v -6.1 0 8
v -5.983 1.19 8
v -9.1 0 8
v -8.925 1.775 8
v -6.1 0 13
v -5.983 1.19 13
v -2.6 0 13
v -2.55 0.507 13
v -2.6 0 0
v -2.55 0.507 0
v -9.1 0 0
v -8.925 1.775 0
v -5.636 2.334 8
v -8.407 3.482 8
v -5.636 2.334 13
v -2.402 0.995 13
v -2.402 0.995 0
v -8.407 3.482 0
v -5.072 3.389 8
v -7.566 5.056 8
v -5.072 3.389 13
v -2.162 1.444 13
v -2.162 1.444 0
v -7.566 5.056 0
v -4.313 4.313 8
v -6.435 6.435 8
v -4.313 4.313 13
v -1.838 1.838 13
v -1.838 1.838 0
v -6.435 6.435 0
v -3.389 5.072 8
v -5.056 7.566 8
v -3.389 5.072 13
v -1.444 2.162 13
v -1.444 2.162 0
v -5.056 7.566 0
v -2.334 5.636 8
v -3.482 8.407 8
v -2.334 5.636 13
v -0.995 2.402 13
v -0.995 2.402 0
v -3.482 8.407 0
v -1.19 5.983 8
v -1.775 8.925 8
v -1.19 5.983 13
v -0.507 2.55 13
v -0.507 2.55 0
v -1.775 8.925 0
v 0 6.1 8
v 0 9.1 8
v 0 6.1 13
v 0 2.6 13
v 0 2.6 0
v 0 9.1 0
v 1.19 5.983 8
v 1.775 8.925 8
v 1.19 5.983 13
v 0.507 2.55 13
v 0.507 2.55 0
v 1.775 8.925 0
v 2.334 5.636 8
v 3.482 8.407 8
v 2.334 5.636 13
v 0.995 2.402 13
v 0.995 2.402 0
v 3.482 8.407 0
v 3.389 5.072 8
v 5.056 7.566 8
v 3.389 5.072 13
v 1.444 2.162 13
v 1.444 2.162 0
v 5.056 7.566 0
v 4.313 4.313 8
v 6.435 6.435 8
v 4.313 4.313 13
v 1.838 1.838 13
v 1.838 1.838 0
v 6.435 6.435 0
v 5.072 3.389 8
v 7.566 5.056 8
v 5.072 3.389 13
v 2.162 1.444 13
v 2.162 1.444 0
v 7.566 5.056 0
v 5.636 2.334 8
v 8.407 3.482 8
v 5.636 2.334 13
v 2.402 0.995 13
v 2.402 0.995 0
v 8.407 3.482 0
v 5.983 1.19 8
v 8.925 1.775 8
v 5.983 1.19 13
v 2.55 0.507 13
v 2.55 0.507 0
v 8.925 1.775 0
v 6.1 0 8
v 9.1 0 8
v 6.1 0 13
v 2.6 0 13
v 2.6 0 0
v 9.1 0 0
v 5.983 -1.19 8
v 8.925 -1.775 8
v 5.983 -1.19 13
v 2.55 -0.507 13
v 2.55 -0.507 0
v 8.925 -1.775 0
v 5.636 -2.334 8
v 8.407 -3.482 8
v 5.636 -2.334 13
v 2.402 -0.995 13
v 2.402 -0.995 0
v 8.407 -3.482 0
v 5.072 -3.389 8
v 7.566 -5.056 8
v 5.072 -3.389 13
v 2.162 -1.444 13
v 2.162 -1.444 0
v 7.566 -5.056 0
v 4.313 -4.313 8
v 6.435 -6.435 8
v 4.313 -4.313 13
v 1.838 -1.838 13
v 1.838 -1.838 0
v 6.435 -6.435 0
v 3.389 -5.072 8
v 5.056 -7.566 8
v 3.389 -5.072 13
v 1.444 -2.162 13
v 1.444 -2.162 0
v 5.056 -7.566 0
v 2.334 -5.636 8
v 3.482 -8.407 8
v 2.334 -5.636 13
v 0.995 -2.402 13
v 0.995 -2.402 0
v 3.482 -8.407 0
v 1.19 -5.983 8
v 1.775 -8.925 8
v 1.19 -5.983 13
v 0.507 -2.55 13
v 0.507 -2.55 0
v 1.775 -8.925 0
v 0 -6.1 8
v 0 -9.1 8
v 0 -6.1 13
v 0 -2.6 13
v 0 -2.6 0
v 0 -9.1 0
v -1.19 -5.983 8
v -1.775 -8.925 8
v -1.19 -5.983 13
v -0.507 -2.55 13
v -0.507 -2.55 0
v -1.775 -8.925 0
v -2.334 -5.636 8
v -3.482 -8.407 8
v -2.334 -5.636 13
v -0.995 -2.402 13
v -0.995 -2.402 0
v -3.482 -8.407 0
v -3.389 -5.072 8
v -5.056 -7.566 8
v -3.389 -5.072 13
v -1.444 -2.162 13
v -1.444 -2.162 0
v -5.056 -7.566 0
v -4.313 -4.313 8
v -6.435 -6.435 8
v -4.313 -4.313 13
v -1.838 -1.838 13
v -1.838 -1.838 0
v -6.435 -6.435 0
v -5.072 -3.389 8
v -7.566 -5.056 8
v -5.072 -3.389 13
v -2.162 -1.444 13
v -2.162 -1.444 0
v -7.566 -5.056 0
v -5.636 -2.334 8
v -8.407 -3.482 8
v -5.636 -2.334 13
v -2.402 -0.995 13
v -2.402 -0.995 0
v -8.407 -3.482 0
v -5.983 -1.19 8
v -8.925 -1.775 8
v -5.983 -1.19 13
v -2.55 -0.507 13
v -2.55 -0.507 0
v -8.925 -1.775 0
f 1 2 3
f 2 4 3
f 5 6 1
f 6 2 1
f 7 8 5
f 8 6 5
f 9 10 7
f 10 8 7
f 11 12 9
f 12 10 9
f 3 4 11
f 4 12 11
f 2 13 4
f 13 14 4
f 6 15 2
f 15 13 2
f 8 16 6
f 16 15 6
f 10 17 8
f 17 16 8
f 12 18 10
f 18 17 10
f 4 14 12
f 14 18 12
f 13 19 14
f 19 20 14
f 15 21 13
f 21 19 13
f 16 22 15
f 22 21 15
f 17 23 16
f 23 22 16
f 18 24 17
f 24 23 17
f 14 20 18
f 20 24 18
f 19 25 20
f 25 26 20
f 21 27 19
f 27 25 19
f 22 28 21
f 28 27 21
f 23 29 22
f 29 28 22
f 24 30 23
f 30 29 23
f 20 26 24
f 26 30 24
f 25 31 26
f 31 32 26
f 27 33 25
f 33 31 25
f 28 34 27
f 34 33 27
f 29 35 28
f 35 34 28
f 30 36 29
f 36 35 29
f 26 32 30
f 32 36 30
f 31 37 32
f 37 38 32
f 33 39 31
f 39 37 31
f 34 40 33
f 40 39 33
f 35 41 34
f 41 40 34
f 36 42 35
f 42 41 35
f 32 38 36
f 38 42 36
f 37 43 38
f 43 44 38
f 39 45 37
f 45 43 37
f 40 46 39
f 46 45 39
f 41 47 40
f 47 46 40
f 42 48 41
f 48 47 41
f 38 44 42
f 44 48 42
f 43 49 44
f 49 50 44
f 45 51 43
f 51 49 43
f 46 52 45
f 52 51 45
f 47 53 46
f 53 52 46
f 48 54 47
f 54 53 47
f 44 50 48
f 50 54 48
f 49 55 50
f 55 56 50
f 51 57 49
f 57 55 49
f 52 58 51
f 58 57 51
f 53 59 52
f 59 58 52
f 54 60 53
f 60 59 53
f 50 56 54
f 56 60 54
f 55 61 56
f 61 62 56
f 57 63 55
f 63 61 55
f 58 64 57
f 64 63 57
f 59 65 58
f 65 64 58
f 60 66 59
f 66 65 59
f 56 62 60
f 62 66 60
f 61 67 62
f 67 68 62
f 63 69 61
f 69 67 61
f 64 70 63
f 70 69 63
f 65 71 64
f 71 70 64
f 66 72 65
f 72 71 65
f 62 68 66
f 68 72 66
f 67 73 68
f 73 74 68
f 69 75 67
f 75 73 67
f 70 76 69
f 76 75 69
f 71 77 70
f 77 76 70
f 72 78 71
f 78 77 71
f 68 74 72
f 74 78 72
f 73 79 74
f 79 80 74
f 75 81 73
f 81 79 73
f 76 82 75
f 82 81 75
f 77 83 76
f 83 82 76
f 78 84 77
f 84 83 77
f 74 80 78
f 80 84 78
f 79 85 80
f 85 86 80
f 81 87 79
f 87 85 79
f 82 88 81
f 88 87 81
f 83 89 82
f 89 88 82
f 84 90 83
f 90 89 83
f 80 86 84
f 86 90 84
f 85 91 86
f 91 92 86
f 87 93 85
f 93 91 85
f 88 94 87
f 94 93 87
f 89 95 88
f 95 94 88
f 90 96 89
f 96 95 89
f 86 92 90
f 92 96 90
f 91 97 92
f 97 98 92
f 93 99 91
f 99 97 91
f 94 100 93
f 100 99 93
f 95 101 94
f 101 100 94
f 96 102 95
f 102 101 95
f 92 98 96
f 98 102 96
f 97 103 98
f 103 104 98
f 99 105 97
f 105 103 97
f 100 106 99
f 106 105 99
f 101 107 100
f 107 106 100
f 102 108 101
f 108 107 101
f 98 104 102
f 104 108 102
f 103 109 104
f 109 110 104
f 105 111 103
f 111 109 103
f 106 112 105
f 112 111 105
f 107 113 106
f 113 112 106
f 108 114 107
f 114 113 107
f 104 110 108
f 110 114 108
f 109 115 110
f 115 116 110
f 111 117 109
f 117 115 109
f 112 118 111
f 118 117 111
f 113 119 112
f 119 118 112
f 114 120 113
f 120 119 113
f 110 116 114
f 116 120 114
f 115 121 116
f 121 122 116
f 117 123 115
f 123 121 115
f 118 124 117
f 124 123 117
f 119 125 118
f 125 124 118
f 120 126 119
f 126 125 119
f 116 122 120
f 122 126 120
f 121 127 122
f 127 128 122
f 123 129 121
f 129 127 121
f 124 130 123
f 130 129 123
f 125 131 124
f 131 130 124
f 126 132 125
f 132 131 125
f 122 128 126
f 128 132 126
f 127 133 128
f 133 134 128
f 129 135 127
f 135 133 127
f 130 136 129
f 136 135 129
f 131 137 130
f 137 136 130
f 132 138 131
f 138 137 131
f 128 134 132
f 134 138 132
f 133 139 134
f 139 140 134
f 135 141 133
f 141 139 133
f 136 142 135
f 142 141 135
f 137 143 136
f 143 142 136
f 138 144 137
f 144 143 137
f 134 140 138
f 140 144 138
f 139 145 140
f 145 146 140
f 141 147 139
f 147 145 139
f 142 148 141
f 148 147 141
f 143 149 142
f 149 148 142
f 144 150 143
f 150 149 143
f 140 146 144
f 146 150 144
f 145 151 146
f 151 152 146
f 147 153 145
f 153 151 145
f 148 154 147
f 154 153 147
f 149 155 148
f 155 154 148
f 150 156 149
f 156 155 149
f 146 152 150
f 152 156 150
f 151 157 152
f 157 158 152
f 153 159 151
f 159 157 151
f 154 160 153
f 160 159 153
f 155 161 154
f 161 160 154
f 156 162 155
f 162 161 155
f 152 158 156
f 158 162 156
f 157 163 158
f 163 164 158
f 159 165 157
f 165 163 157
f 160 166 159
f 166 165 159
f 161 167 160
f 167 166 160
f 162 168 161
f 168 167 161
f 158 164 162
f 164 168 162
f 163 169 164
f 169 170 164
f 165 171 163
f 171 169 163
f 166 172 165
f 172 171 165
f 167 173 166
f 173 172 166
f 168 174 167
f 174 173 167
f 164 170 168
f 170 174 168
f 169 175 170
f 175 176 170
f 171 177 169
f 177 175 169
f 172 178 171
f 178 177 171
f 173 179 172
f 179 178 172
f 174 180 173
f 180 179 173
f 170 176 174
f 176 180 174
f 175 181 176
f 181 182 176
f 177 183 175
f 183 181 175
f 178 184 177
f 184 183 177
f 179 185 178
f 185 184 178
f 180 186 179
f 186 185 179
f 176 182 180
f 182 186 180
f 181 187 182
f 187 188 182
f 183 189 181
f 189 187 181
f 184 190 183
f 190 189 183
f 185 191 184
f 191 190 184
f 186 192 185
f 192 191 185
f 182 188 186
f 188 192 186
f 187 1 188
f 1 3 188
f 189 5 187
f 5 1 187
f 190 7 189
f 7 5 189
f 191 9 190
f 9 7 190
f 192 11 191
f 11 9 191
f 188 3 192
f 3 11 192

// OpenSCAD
$fn = 32;

// ----------------------------------------------------------------------
// Form washer: stepped_c washer, 18.2 mm outside, 5.2 mm bore
// ----------------------------------------------------------------------

// --- parameters (mm) ---
revolve_angle = 360;      // full turn around the Z axis
profile_points = 6;       // points of the closed outline

profile = [[2.6, 0], [9.1, 0], [9.1, 8], [6.1, 8], [6.1, 13], [2.6, 13]];  // single closed polygon, 6 points, counter clockwise

// --- the one profile operation ---
rotate_extrude(angle = revolve_angle) polygon(points = profile);
